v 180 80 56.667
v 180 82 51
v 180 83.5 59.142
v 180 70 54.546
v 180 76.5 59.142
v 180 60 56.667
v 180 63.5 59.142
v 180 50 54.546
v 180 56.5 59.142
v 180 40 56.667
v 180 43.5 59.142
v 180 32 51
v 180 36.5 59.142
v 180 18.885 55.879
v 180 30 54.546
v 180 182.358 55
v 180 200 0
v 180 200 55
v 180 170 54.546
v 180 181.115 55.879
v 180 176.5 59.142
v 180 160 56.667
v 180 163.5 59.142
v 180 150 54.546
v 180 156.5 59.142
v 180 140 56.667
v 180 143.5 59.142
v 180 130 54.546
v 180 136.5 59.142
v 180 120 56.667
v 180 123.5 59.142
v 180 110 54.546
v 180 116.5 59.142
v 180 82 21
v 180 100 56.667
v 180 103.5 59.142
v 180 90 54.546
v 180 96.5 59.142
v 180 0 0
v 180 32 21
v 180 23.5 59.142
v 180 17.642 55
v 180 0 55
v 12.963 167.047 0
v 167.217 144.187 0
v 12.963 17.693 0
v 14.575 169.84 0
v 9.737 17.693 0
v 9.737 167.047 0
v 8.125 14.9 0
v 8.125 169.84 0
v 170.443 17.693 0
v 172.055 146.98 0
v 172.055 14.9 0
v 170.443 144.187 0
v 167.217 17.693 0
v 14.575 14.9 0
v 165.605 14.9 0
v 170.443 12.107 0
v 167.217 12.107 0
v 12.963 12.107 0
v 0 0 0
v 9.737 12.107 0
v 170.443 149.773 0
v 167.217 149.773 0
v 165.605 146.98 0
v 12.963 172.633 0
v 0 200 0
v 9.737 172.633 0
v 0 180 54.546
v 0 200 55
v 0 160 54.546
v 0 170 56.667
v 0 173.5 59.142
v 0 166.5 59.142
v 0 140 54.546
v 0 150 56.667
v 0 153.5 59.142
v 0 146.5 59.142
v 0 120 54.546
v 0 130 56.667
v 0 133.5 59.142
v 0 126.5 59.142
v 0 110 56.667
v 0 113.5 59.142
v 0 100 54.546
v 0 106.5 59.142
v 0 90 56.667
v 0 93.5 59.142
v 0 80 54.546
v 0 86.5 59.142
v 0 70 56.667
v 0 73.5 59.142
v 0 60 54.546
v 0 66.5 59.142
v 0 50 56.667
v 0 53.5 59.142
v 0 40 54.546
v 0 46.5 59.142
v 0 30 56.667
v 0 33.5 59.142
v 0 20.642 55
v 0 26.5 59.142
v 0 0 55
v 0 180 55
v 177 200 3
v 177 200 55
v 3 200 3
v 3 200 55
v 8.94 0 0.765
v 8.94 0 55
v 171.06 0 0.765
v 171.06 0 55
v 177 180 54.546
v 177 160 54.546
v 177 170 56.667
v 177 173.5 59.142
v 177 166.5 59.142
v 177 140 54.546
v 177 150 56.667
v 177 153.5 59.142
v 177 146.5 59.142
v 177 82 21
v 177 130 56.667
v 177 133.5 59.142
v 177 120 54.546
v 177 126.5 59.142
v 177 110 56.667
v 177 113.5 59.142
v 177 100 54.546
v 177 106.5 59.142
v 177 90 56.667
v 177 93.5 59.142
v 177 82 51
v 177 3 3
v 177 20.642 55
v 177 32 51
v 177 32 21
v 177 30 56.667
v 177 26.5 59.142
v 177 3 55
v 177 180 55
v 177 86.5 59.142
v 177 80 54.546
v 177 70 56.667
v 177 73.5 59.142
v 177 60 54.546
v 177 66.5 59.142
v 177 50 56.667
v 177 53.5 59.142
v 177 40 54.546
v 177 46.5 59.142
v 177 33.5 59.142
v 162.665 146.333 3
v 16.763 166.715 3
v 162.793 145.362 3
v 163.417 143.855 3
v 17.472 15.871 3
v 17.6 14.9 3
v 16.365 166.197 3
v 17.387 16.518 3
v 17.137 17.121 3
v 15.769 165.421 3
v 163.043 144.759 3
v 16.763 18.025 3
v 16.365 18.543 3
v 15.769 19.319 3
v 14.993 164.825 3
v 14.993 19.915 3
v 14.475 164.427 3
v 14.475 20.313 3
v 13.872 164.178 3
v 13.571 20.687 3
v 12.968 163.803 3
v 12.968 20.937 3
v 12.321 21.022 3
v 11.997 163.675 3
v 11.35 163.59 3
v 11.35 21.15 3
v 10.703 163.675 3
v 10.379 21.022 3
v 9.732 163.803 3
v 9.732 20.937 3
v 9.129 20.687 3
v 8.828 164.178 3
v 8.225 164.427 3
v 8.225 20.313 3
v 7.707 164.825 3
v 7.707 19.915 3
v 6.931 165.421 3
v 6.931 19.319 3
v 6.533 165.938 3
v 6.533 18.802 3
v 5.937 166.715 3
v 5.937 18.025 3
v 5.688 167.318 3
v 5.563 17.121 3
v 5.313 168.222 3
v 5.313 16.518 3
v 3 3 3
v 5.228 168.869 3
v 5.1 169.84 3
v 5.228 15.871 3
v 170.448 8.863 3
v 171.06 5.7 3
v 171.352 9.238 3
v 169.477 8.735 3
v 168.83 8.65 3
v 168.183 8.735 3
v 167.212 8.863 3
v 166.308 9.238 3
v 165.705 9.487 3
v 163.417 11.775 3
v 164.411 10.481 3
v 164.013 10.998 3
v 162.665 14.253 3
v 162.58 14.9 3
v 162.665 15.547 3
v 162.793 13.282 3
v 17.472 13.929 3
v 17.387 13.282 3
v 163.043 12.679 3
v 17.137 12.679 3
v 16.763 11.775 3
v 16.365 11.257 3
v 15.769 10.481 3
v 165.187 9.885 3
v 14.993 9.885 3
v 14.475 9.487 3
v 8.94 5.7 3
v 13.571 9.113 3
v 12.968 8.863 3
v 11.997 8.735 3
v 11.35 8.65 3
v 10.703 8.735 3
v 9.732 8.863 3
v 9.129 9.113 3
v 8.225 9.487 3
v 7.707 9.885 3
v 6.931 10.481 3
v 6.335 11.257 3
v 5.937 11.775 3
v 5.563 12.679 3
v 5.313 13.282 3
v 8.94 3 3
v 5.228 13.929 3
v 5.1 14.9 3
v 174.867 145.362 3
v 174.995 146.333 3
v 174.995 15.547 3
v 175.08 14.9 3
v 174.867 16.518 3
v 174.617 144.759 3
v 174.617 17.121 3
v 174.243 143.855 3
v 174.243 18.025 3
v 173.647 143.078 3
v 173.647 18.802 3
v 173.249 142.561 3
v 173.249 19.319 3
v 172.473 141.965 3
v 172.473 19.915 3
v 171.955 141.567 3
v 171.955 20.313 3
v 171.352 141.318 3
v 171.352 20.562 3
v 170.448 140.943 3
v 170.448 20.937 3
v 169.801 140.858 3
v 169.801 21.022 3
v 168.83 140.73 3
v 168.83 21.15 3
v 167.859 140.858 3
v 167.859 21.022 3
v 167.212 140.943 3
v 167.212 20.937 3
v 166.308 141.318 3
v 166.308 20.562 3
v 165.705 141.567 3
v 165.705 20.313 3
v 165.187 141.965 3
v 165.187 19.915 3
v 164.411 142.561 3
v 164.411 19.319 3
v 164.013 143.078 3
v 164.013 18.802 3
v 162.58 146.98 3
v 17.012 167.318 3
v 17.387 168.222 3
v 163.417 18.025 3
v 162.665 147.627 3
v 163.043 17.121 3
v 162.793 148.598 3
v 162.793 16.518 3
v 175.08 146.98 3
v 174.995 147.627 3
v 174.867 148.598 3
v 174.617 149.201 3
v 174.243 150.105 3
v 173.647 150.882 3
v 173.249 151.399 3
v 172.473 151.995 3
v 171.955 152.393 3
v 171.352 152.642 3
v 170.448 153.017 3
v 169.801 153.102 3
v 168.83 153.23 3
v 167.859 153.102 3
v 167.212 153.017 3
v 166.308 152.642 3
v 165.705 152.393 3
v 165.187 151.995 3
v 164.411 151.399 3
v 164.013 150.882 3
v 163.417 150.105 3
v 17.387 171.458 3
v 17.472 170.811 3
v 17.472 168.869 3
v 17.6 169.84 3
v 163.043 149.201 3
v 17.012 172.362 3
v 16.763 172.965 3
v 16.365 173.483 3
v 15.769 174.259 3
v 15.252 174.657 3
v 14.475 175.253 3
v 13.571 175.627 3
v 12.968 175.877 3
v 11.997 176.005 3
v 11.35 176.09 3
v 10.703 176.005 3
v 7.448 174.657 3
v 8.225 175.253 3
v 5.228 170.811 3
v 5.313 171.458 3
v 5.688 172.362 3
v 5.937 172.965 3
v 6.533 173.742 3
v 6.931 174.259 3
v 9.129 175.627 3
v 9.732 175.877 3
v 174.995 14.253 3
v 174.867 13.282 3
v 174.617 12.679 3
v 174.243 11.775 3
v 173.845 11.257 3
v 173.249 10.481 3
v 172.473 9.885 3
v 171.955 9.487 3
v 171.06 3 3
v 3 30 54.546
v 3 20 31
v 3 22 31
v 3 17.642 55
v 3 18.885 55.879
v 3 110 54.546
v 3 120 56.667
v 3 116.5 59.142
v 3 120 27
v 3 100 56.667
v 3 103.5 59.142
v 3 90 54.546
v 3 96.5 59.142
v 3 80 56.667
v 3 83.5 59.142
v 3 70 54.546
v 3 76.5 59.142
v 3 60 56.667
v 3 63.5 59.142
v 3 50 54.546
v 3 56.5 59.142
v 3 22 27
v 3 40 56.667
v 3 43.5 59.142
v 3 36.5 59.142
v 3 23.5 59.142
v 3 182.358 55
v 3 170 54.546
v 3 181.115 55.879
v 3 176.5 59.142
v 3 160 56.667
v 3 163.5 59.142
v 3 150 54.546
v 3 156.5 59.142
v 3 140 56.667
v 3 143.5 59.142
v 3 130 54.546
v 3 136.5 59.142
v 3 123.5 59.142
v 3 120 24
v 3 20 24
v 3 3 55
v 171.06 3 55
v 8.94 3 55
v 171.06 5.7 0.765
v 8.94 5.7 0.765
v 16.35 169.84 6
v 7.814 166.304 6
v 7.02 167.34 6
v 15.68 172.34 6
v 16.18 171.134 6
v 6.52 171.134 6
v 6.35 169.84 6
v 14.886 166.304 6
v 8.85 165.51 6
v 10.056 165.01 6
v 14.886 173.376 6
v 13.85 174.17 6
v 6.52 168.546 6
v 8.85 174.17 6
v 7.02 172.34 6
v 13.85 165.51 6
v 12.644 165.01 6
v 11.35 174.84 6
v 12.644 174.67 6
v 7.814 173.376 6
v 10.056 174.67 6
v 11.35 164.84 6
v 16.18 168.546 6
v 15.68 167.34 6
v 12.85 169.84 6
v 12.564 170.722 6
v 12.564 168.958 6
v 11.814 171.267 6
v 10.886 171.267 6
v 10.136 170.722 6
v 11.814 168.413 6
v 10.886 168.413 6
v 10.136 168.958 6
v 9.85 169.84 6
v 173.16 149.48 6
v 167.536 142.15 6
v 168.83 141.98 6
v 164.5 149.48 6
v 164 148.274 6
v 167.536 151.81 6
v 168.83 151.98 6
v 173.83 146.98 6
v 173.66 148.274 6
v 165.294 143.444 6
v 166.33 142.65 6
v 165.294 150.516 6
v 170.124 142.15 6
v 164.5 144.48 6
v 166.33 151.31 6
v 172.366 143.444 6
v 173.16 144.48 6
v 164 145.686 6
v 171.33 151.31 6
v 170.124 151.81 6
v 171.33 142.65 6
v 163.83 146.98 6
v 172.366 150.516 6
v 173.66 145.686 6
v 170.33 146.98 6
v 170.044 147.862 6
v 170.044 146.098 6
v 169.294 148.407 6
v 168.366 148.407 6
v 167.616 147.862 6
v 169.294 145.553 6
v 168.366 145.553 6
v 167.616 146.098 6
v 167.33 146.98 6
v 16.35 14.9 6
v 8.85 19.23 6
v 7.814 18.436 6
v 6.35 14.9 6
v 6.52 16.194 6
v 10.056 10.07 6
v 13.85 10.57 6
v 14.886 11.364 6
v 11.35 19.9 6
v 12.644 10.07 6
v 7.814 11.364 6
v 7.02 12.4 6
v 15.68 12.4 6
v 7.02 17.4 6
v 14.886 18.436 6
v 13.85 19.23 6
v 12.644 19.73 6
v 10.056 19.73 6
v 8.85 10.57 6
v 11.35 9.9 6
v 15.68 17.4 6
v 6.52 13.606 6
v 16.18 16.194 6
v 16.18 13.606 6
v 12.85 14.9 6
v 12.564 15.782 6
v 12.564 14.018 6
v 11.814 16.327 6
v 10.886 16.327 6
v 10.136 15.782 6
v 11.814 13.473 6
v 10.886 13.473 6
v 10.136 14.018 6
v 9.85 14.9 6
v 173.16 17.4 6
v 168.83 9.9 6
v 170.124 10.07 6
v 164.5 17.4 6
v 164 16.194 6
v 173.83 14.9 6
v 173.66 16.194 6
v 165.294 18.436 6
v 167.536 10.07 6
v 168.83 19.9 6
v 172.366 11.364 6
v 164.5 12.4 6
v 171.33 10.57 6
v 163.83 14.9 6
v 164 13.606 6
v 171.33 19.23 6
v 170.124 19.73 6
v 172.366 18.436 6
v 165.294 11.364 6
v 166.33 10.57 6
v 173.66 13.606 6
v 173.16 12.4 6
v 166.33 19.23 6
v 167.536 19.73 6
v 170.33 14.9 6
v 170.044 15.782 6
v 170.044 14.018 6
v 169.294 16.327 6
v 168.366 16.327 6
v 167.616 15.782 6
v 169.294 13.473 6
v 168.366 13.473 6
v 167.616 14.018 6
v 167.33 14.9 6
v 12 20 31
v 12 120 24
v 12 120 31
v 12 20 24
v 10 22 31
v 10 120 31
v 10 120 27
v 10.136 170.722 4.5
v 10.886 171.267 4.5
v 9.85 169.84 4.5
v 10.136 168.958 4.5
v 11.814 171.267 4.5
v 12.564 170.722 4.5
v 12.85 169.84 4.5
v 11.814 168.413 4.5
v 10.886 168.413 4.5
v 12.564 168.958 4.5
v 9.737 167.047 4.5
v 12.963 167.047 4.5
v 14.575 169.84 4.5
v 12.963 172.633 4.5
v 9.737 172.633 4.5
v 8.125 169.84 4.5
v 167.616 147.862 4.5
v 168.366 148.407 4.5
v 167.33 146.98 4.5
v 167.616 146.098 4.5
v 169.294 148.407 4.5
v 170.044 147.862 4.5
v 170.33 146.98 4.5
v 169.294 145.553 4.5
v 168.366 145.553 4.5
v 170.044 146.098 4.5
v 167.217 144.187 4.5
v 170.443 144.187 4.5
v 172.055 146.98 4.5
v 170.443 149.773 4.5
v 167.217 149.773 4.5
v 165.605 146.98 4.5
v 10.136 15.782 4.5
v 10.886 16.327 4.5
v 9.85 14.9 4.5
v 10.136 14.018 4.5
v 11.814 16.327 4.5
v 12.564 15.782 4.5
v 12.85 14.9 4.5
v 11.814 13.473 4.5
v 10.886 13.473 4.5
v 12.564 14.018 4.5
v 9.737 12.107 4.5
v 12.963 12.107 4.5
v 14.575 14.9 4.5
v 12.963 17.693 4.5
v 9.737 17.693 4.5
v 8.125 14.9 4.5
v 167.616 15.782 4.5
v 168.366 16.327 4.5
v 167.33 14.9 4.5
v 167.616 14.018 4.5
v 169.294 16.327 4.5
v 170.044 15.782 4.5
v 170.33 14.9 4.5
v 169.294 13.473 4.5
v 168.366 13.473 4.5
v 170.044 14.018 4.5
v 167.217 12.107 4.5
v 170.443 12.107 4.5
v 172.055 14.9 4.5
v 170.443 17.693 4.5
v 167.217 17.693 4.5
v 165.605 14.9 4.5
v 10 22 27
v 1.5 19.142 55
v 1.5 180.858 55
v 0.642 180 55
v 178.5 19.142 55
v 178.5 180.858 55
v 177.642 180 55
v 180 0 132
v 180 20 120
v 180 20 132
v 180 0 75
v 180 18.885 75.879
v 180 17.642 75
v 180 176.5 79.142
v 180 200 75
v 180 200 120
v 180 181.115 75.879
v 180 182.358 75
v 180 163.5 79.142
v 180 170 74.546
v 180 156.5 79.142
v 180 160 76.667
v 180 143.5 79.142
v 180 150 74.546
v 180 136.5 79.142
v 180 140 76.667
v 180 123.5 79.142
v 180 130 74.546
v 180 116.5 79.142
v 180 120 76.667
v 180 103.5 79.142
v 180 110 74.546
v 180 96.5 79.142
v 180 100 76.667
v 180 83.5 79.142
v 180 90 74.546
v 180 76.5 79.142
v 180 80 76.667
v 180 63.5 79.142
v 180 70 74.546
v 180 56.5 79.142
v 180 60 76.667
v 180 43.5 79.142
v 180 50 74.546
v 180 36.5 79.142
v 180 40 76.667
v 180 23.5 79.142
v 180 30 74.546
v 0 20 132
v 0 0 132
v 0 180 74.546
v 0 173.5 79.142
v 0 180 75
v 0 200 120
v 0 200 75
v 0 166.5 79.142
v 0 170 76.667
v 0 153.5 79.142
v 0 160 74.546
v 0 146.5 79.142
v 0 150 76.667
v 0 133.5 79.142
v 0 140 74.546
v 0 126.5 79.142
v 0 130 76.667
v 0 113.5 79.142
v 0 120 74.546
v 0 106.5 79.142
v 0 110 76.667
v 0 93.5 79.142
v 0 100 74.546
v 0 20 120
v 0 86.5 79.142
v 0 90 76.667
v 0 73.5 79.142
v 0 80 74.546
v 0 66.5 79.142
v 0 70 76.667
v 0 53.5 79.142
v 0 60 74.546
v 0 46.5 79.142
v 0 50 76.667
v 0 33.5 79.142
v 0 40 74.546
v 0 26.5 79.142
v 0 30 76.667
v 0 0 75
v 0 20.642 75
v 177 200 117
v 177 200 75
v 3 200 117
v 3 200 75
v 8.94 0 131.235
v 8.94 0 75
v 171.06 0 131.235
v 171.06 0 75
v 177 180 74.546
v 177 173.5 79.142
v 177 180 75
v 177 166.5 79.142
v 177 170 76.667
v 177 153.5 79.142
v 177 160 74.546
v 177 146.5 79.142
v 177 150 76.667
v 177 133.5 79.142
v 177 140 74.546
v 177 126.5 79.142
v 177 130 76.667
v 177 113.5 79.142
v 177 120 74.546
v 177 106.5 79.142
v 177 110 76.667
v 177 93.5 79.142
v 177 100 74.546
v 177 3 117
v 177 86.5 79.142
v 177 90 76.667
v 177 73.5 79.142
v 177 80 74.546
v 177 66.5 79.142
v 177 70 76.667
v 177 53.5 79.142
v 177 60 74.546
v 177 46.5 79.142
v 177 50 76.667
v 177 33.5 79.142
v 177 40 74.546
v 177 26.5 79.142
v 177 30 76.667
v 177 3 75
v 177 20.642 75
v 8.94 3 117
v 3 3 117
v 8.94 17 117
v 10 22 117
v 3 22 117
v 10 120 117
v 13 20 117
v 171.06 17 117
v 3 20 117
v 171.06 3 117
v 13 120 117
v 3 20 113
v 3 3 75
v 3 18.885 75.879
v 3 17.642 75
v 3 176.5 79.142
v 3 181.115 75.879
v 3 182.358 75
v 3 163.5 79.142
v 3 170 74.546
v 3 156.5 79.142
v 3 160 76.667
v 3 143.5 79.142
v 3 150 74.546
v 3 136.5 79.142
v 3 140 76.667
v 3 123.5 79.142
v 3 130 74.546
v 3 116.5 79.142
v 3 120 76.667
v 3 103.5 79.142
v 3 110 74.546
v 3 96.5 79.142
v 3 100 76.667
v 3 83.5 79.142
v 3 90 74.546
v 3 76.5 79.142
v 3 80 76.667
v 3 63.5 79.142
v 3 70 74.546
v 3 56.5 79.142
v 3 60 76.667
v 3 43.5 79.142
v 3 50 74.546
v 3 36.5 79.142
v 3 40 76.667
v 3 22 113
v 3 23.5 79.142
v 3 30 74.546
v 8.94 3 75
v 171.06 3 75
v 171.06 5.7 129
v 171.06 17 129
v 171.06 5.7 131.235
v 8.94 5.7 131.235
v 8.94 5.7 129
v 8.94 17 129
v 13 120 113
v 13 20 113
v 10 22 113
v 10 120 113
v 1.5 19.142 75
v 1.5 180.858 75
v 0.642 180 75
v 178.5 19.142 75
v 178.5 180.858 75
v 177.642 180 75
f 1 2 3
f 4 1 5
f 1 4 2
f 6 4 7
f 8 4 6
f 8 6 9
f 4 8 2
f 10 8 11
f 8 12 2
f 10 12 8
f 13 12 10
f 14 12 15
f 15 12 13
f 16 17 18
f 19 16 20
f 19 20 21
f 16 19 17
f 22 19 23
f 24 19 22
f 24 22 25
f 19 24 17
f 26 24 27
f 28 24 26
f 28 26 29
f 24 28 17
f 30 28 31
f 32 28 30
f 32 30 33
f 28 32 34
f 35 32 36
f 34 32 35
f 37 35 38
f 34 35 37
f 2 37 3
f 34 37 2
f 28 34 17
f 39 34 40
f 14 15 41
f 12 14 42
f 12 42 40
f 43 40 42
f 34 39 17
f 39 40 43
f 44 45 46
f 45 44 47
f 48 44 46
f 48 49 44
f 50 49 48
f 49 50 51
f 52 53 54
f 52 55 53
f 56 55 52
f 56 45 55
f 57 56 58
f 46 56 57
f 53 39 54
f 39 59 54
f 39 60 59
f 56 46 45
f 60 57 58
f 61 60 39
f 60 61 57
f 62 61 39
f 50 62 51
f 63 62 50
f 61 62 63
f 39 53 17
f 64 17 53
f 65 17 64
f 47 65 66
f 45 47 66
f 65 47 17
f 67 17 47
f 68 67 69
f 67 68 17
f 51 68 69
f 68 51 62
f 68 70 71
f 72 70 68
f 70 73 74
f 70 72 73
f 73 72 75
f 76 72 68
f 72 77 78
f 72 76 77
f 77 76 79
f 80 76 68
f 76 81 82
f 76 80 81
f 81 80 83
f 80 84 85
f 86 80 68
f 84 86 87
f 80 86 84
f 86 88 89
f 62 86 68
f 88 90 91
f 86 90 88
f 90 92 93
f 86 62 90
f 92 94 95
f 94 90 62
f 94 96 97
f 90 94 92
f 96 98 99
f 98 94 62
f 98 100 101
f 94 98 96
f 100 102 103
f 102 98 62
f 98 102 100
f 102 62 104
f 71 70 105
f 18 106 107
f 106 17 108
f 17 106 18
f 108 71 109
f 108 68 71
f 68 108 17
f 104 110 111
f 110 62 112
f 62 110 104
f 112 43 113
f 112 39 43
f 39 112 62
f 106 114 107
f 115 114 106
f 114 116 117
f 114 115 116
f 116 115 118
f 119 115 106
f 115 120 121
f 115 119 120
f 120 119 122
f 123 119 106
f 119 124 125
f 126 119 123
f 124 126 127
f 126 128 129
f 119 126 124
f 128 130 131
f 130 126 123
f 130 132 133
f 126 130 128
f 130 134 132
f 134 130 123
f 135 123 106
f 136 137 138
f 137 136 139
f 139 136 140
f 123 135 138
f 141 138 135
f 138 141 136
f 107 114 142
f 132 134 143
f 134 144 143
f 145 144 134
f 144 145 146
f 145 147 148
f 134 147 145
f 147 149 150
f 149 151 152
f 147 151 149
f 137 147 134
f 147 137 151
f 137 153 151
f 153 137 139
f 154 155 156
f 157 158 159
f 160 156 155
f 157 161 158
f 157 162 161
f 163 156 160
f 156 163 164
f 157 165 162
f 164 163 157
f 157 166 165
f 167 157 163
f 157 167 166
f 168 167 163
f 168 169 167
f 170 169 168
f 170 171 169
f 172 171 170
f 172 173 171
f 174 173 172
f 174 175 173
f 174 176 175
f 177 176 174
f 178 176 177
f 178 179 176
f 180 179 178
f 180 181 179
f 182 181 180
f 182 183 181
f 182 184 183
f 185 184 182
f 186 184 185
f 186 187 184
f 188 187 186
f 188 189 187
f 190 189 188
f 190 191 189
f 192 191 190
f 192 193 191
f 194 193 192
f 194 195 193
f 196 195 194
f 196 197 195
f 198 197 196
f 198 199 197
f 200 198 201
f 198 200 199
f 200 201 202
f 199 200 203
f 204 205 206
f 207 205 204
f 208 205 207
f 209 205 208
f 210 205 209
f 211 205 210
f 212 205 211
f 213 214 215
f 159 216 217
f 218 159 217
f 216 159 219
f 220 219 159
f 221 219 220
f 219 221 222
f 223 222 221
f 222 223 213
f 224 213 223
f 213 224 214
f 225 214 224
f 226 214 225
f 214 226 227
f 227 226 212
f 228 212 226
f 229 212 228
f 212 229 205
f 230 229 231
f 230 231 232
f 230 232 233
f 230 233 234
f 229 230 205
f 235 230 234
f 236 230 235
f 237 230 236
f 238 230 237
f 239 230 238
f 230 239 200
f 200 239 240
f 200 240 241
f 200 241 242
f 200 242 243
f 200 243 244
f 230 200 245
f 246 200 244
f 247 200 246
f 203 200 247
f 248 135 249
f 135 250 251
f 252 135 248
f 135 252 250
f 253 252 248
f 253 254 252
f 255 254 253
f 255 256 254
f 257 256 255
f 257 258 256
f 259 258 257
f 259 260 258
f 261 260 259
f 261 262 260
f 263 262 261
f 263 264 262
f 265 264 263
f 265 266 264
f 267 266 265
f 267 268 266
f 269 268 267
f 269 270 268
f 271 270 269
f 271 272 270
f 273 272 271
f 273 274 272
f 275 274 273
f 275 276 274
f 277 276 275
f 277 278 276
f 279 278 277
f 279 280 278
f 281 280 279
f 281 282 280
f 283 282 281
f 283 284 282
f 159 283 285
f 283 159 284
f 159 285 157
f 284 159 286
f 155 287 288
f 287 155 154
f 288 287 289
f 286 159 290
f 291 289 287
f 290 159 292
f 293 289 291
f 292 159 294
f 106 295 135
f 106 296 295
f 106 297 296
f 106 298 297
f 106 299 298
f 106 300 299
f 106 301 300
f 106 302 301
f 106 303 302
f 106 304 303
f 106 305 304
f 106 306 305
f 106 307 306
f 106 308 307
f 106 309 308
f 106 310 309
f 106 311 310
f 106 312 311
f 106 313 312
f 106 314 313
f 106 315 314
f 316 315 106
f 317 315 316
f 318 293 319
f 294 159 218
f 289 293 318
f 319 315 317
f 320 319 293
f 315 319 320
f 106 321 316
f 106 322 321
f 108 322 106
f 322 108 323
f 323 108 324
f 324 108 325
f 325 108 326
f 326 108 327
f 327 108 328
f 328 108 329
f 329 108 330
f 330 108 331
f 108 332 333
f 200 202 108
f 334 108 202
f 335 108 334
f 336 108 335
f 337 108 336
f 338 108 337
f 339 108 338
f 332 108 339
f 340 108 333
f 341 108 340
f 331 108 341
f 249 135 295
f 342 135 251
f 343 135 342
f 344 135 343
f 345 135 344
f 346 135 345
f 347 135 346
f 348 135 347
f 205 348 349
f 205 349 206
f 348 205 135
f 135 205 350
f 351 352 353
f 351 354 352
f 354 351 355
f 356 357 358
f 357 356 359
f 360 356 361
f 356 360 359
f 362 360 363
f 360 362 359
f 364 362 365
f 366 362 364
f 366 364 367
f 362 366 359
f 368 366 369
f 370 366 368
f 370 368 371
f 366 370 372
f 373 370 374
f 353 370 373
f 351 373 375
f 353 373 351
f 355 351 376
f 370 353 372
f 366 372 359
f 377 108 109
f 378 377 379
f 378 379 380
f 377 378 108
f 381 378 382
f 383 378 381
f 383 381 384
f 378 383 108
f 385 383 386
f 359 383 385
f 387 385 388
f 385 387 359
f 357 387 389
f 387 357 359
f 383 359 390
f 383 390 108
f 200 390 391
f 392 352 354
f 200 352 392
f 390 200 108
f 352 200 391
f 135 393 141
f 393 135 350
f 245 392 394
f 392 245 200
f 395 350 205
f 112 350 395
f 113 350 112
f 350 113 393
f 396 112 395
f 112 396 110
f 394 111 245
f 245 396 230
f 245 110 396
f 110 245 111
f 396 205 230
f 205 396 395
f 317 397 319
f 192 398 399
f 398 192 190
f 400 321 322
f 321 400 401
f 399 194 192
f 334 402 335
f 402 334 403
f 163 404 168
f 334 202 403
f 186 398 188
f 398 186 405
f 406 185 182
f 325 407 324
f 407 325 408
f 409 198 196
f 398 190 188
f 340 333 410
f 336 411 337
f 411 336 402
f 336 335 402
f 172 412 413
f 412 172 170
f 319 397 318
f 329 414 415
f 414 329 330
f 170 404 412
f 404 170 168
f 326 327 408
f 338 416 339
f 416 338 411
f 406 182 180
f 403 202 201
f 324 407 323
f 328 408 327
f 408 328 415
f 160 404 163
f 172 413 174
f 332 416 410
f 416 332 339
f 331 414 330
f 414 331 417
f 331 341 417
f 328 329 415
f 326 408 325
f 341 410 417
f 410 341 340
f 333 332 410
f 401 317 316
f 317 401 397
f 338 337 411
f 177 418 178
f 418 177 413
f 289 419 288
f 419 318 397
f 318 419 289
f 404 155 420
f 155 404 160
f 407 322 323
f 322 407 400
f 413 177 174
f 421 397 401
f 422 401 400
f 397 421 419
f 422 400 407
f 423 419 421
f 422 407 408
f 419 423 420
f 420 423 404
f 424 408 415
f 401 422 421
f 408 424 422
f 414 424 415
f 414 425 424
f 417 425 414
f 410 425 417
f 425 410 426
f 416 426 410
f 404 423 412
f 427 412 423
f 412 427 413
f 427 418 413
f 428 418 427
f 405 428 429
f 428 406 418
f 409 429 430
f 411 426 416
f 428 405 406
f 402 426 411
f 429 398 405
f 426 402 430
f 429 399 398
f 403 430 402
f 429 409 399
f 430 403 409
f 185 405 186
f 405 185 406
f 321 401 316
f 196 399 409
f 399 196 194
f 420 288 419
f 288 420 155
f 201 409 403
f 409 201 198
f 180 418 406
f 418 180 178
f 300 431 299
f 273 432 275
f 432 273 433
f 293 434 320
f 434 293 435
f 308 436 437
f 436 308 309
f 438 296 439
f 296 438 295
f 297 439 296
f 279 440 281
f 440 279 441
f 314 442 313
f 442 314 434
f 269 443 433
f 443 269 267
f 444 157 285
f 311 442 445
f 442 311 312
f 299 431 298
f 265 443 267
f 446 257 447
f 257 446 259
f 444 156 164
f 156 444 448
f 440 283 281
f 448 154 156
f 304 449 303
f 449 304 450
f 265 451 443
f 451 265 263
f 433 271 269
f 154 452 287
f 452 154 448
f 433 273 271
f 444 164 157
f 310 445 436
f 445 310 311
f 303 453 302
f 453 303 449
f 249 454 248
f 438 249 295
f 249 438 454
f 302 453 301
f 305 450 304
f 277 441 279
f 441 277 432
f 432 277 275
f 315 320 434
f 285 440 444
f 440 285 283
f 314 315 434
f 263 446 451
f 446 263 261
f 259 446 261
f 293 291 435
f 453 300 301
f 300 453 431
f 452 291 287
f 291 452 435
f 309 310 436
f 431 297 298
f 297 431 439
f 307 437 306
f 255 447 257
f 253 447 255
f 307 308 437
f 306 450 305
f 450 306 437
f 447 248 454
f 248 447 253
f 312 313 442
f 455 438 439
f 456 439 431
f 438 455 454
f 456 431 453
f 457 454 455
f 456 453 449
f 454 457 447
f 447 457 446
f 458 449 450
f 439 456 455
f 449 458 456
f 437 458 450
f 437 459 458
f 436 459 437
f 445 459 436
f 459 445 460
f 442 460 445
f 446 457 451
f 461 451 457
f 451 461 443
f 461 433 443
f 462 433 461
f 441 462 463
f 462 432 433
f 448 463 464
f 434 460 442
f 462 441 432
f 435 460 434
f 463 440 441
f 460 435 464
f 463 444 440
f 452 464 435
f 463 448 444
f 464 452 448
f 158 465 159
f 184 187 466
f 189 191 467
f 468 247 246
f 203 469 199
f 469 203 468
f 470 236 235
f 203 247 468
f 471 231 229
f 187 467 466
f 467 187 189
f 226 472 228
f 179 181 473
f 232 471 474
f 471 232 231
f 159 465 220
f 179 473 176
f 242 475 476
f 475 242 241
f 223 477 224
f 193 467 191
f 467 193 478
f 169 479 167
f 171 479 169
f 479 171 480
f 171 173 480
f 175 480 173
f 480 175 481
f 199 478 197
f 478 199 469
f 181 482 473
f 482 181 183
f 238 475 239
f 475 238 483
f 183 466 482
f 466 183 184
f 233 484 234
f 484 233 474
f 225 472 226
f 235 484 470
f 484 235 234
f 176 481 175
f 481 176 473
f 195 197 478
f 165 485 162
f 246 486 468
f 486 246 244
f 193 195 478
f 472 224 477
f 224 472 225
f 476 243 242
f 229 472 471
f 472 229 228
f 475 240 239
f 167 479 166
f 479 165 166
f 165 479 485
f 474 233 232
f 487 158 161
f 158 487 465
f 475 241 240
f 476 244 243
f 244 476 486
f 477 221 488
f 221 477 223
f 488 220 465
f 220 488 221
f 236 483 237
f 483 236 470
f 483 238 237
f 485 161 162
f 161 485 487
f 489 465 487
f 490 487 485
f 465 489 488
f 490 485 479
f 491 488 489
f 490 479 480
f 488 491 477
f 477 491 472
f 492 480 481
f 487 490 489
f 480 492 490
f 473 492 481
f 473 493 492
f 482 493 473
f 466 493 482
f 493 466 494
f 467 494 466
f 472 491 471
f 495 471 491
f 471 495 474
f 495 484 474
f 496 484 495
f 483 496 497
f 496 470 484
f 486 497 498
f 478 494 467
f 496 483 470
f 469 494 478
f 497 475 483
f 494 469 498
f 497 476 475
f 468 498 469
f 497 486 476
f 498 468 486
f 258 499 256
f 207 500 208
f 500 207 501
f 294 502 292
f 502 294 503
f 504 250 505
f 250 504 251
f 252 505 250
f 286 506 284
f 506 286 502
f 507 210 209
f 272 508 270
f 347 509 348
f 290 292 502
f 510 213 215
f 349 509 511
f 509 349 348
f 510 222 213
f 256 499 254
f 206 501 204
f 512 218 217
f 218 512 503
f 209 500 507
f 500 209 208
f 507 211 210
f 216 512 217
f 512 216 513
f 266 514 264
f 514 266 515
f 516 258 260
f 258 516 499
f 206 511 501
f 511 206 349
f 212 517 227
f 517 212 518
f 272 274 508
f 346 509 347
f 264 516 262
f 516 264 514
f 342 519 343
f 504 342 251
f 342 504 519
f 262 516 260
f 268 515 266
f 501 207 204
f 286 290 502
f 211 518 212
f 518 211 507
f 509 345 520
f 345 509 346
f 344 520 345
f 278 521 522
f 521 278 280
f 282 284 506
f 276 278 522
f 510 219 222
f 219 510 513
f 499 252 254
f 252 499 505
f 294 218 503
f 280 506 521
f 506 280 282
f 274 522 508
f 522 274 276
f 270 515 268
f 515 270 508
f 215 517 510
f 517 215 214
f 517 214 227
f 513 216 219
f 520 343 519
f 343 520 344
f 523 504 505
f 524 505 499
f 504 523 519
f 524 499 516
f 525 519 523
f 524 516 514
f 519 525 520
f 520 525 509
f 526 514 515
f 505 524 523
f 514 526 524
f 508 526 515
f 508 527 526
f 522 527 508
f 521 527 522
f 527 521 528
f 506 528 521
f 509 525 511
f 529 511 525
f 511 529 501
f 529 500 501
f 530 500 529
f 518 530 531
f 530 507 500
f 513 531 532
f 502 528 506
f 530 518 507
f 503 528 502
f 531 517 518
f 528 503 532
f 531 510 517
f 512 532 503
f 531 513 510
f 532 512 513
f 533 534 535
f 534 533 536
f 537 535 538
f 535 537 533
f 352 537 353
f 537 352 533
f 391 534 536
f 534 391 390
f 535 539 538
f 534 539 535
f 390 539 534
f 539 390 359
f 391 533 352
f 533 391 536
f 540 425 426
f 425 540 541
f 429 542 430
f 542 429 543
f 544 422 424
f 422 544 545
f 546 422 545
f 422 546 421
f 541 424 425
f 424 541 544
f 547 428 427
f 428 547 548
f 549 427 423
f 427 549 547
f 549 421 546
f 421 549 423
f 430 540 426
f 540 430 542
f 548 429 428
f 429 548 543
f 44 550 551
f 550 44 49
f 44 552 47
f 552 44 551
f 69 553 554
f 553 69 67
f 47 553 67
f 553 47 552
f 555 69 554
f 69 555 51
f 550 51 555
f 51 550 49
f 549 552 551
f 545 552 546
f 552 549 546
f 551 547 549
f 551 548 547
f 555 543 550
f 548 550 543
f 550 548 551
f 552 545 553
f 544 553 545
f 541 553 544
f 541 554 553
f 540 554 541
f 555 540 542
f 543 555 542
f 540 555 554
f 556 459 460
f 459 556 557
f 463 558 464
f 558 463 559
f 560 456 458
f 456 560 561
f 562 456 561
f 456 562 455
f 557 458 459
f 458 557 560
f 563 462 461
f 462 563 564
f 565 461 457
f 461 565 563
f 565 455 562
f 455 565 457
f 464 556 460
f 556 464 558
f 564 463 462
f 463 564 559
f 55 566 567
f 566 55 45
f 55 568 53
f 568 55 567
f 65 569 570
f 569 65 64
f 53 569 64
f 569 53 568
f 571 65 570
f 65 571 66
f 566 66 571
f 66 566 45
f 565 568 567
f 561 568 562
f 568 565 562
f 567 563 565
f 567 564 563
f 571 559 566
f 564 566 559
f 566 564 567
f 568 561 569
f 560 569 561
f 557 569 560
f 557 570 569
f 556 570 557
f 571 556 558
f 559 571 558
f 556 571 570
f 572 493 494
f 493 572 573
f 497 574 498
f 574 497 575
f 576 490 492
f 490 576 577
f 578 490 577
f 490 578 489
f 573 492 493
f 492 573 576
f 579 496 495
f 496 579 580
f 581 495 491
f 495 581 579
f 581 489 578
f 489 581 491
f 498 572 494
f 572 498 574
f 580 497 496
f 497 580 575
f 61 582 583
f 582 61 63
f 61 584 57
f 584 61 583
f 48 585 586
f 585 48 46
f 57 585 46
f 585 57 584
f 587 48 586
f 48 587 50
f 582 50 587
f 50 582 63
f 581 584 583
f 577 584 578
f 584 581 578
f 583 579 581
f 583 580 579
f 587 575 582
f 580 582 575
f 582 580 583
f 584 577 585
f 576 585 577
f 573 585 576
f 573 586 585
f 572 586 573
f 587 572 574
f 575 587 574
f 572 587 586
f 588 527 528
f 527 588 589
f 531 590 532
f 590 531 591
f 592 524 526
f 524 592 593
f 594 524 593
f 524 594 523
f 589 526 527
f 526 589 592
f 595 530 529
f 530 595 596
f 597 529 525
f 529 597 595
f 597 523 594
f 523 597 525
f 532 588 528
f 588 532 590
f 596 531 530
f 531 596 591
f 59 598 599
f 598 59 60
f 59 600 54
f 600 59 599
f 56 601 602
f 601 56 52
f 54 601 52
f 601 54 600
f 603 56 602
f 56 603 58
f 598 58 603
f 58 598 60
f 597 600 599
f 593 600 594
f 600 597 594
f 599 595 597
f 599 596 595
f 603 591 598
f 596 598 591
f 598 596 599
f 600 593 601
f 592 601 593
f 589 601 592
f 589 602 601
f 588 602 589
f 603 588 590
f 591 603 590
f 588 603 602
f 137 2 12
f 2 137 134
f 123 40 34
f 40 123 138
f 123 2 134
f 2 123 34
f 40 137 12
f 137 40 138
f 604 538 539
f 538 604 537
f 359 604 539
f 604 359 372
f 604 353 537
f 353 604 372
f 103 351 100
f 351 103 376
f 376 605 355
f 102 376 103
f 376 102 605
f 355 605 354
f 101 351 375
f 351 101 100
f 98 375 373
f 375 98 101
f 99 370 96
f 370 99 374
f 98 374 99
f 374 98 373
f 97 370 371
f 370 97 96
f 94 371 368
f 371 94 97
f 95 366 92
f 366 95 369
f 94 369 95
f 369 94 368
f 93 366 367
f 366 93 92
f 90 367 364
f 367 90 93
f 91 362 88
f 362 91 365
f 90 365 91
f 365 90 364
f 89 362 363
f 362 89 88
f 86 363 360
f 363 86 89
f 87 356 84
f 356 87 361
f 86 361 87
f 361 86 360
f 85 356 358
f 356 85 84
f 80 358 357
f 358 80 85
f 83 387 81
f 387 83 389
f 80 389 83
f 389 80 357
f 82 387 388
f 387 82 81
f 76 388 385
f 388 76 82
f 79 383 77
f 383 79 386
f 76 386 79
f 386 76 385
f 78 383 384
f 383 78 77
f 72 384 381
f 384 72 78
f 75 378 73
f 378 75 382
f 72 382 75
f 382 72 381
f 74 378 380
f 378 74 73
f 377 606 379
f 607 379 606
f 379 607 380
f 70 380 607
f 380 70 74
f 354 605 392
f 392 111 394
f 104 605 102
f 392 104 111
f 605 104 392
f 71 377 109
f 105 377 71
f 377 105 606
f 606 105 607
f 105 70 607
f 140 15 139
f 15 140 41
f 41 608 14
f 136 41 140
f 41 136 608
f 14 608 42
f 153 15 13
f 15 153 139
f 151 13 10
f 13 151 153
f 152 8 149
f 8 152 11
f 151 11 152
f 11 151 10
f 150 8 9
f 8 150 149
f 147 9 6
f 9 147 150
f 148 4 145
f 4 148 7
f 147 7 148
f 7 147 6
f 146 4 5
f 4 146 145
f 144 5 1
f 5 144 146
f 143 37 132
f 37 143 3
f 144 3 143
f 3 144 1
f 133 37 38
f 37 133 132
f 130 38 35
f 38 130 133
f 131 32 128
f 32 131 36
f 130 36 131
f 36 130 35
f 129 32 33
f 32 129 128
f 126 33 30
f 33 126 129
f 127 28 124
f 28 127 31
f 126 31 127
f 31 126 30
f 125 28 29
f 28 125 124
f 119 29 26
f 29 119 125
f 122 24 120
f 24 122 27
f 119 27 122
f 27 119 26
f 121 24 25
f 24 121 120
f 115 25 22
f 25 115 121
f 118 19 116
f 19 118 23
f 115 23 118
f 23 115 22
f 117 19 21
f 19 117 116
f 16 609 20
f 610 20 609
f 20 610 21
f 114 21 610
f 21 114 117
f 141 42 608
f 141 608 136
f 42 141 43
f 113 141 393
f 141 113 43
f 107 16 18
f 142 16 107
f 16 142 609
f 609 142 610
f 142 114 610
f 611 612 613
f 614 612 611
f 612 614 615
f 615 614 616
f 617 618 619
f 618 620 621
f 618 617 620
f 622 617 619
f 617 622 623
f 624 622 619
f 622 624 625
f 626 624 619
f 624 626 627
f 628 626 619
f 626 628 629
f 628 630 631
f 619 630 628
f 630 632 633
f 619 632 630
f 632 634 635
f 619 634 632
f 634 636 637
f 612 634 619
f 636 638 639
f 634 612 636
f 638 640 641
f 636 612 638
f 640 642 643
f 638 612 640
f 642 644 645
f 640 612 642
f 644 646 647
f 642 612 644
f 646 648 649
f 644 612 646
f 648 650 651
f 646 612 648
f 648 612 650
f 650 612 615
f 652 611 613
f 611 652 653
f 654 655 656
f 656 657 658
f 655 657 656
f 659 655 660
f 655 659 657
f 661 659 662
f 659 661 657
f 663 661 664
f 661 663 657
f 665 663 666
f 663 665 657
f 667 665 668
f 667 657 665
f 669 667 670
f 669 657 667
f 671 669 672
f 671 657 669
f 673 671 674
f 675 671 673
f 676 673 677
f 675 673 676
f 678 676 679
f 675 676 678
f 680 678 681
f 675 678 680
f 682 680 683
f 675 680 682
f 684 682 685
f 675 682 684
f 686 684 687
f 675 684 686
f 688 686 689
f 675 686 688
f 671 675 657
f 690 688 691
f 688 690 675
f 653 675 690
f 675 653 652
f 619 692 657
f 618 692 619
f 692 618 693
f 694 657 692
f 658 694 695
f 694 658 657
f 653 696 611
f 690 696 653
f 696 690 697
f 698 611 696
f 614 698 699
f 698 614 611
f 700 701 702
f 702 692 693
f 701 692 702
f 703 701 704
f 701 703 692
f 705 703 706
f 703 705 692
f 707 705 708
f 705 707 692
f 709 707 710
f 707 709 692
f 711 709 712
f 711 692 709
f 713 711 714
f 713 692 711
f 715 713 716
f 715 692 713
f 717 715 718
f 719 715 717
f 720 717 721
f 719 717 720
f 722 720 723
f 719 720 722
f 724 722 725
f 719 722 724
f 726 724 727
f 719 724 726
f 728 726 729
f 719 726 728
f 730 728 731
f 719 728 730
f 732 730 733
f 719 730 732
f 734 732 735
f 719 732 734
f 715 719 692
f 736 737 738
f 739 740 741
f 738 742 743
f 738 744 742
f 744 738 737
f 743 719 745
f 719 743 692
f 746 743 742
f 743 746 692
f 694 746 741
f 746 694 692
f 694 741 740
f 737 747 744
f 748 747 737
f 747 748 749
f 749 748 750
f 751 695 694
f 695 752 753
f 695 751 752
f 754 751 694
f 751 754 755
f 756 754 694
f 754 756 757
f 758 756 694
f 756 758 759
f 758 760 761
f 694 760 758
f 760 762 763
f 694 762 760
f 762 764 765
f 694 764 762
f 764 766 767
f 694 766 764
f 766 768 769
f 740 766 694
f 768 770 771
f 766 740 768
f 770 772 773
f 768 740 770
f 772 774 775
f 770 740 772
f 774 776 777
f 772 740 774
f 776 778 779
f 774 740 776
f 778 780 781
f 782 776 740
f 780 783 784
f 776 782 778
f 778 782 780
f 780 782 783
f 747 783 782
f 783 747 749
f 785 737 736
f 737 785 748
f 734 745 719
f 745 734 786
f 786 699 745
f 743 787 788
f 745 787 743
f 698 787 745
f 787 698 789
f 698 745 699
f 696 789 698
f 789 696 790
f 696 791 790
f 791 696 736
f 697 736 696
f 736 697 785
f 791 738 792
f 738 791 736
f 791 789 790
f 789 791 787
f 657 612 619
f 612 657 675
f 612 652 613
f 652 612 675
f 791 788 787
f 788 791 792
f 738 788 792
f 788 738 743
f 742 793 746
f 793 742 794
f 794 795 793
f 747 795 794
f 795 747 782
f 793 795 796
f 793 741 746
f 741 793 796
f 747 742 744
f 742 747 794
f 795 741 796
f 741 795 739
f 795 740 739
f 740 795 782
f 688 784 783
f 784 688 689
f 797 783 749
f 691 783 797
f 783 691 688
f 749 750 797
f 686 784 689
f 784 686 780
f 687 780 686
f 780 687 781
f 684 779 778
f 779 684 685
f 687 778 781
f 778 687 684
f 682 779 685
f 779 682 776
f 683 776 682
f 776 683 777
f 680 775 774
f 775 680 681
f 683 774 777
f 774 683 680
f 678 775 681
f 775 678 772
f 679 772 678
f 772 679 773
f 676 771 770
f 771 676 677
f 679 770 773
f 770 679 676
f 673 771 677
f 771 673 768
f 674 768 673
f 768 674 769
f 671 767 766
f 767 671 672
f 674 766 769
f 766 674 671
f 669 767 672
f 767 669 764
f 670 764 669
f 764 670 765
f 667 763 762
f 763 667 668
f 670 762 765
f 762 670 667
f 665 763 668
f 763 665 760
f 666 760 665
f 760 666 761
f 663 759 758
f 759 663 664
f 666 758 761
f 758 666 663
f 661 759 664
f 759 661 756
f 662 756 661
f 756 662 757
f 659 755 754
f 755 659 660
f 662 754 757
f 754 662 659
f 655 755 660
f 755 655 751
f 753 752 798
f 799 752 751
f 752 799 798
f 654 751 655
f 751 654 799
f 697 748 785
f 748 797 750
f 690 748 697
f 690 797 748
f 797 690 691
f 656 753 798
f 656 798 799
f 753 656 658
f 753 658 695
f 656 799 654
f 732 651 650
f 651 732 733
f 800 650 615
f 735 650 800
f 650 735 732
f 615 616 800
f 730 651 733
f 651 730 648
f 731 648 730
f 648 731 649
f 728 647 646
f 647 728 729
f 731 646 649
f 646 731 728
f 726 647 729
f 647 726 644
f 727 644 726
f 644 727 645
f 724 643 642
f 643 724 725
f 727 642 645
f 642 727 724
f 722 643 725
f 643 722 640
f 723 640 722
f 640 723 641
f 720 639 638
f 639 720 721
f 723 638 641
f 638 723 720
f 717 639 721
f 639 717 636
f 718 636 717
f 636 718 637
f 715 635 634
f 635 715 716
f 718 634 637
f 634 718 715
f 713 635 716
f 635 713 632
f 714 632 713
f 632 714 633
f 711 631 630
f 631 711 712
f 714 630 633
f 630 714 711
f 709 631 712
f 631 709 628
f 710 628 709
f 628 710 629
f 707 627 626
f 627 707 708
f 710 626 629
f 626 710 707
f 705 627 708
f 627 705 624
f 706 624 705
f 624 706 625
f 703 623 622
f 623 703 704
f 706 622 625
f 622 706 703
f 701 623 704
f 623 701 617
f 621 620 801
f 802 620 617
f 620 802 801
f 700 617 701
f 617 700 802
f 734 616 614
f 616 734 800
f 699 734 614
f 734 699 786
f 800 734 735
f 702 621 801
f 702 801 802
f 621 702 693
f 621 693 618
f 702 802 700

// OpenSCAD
/*

*/
// 2 DIN headunit
w = 180;
h = 100;
h_front = 112;
d_front = 20;
d = 180 + d_front;

// LCD screen dimentions
lcdw = 161.92 + 0.2;
lcdh = 110.27 + 0.2;
lcdt = 5.7;

// SSD dimentions
ssdw = 70.0;
ssdd = 100.0;
ssdt = 7.0;

wall = 3;

// Bottom of ATX board from base
height_mb = wall + 3;


module m3_nut_trap() {
	cylinder(r = 5.5 / 2 / cos(180 / 6) + 0.05, $fn=6, h=4.5);
}

module atxmountinghole(x, y, generate_holes) {
	// Translate from the C hole datum to a reference point
   // on the bottom left
	translate([6.35 + x, 170 - y - 10.16, 0]) {
		if (generate_holes) {
			union() {
				cylinder(h=20, d=3, $fn=10);
				m3_nut_trap();
			}
		} else {
			cylinder(h=height_mb, d1=15, d2=10);
		}
	}
}


module vent() {
	linear_extrude(height = 20) import("openivi-vents.dxf");
}

// This generates two solids. The first is the positive material that should
// be added to the model. The second run is called with generate_holes=true
// and generates the material that needs to be removed.
module miniatx(generate_holes) {
	// Mini ATX motherboard spec on page 9 of
	// http://formfactors.org/developer%5Cspecs%5Cmini_itx_spec_V1_1.pdf
		atxmountinghole(0, 0, generate_holes); // Hole C
		atxmountinghole(157.48, 22.86, generate_holes); // Hole F
		atxmountinghole(0, 154.94, generate_holes); // Hole H
		atxmountinghole(157.48, 154.94, generate_holes); // Hole J
	// PicoPSU
	if (generate_holes) {
		translate([170 - 40 + 8, 22, height_mb + 15]) cube([40, 50, 30]);
	}
	// Visualise the location of the motherboard
	translate([0, 0, height_mb]) % cube([170,170,17]);
	// Visualise the location of the rear connectors
	translate([7.52 + 6.35, 170-30+1, height_mb]) % cube([158.75, 40, 40]);

}

module ssd_holder(generate_holes) {
	if (generate_holes) {
		// A SSD-shaped hole
		translate([0, 2, 0]) cube([ssdt, ssdd, ssdw]);
	} else {
		// Bottom mounting rail
		translate([-1, 0, -wall]) cube([10, ssdd, 4 + wall]);
		// Top mounting rail
		translate([0, 0, ssdw - 4]) cube([10, ssdd, 4 + wall -1]);
	}
	% cube([ssdt, ssdd, ssdw]);
}

module case() {

	difference () {
		union () {
			difference() {
				cube([w, d, h_front]);
				// Interiour volume
				translate([wall,wall,wall]) cube([w-wall*2, d, h - 2*wall]);
				// LCD
				translate([(w-lcdw)/2, -1, (h_front-lcdh)/2]) cube([lcdw, lcdt+1, lcdh]);
				// Thinned down top
				translate([-1, 20, h]) cube([w+2, d, h_front - h + 1]);
				// Interior volume in top front
				translate([(w-lcdw)/2, -1, h_front - wall - 20]) cube([lcdw, 20-wall+1, 20]);
				// 'OPENIVI' vents
				translate([w/2-50, 50, h-10]) vent();
				translate([w/2-50, 100, h-10]) vent();
			}
			translate([5, 10, 0]) miniatx(false);
			translate([wall, 20, h-wall-ssdw]) ssd_holder(false);
		}
		translate([5, 10, 0]) miniatx(true);
		translate([wall, 20, h-wall-ssdw]) ssd_holder(true);

	}
}

module teeth() {
	translate([-20, -1, 0]) cube([40, 25, 10]);
	for(i=[25:20:d-20]) {
		translate([0,i,0]) 
		rotate([0,45,45]) cube([20,20,20], true);
		translate([0,i+10,0]) 
		rotate([0,45,-45]) cube([20,20,20], true);
	}
	translate([-20, d-20, 0]) cube([40, 50, 10]);
}

module half_printablevolume() {
		translate([-1,-1,-1]) cube([w+2, d+2, h/2+1]);
		translate([wall/2, 0, h/2-5]) teeth();
		translate([w-wall/2, 0, h/2-5]) teeth();
}

module printable() {

	intersection() {
		case();
		half_printablevolume();
	}

	translate([0,0,20])
	difference() {
		case();
		half_printablevolume();
	}
}

module slice() {
	intersection() {
		case();
		translate([w/2,-500,-500]) cube([1000,1000,1000]);
	}
}

// A couple of horizontal slices through the unit, to check that
// the parts will fit
module 2d_slices() {
	projection(cut=true) translate([0,0,-30]) case();
	projection(cut=true) translate([190,0,-1]) case();
}

printable();
//case();
//slice();

//2d_slices();
